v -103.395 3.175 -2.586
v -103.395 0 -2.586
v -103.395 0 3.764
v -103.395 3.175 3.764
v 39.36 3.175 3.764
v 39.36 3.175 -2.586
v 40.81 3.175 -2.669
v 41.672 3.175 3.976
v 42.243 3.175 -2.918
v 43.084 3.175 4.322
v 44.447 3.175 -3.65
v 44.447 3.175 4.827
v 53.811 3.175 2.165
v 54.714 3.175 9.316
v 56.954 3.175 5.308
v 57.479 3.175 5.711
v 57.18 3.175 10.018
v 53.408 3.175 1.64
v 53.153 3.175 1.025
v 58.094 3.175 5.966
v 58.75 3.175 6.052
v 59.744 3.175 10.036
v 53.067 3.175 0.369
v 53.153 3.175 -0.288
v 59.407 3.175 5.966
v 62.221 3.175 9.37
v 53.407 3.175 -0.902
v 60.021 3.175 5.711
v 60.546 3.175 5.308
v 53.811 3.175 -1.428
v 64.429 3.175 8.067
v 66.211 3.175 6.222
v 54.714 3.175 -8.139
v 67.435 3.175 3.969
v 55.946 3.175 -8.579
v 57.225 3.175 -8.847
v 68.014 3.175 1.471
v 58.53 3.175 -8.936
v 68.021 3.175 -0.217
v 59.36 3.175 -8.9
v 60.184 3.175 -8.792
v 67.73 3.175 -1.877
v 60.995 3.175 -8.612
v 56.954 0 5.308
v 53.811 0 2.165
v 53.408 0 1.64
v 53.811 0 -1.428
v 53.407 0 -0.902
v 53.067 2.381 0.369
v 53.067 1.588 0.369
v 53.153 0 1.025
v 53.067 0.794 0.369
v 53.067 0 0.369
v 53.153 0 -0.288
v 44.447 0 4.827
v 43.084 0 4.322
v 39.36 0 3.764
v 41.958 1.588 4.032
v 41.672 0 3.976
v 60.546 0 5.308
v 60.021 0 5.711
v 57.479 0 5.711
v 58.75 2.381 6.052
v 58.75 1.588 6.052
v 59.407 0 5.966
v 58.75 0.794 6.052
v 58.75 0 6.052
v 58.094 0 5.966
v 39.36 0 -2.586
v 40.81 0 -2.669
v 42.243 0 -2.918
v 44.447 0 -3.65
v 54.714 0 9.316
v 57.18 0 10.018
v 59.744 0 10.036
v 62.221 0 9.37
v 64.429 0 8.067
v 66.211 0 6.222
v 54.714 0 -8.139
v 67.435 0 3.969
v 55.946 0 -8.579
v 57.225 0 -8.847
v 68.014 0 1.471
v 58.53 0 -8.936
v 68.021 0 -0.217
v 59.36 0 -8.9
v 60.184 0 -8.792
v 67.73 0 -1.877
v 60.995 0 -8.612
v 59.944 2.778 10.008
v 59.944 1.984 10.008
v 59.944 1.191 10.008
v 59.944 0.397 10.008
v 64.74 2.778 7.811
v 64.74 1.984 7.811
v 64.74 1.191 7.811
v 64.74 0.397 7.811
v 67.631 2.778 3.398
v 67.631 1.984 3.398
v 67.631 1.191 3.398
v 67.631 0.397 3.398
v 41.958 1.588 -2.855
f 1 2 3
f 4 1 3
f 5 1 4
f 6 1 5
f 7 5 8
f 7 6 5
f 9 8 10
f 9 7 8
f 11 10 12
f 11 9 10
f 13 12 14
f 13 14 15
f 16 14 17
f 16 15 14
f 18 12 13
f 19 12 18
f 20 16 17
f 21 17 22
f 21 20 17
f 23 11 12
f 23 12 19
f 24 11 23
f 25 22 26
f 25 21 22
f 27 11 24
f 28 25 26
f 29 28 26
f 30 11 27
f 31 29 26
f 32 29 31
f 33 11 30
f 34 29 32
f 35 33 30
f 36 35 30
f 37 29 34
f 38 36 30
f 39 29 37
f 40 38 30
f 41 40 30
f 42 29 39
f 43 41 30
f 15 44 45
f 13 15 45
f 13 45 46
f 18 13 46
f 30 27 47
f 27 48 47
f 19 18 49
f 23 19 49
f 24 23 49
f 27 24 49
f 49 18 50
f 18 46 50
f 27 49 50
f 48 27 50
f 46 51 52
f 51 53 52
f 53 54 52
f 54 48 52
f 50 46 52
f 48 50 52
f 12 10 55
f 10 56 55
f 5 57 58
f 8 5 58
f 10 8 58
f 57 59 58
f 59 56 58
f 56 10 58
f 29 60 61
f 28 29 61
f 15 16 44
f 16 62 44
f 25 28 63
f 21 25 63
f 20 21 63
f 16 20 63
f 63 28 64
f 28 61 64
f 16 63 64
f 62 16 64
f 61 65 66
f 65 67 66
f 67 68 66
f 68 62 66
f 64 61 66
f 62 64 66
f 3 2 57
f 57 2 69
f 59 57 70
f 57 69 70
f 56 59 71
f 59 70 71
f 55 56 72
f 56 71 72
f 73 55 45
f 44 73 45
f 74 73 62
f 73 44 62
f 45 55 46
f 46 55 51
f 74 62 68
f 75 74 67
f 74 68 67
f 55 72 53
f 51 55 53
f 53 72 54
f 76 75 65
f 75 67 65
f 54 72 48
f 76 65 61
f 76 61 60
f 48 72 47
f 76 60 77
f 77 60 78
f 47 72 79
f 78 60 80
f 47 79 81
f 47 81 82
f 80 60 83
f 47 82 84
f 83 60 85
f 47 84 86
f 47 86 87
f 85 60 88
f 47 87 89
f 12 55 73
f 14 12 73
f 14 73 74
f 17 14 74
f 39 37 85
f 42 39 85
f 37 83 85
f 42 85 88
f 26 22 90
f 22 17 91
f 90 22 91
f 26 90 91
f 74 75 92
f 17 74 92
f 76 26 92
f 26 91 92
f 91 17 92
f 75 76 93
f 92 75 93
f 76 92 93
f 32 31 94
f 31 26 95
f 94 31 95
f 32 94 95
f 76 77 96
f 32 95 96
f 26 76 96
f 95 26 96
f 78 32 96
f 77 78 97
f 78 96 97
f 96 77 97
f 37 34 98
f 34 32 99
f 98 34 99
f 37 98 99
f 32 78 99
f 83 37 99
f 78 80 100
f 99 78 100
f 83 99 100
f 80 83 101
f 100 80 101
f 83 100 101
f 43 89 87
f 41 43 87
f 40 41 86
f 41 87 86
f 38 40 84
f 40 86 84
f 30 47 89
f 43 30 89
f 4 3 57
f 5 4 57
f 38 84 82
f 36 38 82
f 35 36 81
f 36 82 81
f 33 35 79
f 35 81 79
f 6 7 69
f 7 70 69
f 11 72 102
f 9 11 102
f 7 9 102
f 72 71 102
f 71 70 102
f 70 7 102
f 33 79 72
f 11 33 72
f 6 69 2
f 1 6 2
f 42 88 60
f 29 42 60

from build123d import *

# Parameters (mm, degrees)
BOSS_EXTRUDE1_DEPTH = 3.175


with BuildPart() as part:
    # Sketch1 → Boss-Extrude1 (new body)
    with BuildSketch(Plane(origin=(0, 0, 0), x_dir=(1, 0, 0), z_dir=(0, 1, 0))):
        with BuildLine():
            Line((1.259536023, 2.586263405), (-100.340463977, 2.586263405))
            Line((-100.340463977, 2.586263405), (-103.395029965, 2.586263405))
            Line((-103.395029965, 2.586263405), (-103.395029965, -3.763736604))
            Line((-103.395029965, -3.763736604), (39.35953602, -3.763736604))
            add(Edge.make_bspline(
                [(39.35953602, -3.763736604), (40.672498996, -3.763736604), (41.958231282, -4.032454171), (43.243430957, -4.301060422), (44.446955668, -4.827235355)],
                knots=[0, 0, 0, 0.5, 0.5, 1, 1, 1], degree=2))
            Line((44.446955668, -4.827235355), (54.714405304, -9.316112529))
            add(Edge.make_bspline(
                [(54.714405304, -9.316112529), (55.946669165, -9.854852073), (57.28046692, -10.031425137), (58.61345219, -10.207890641), (59.944261722, -10.008152925), (61.273983438, -9.808578475), (62.497433966, -9.248116189), (63.719884433, -8.68811203), (64.740280541, -7.810763211), (65.759842568, -6.934131546), (66.497371281, -5.80852035), (67.234297131, -4.683829239), (67.631270692, -3.397998317), (68.027919764, -2.113218446), (68.053287839, -0.767742461), (68.078640466, 0.576914214), (67.730413535, 1.876514813)],
                knots=[0, 0, 0, 0.125, 0.125, 0.25, 0.25, 0.375, 0.375, 0.5, 0.5, 0.625, 0.625, 0.75, 0.75, 0.875, 0.875, 1, 1, 1], degree=2))
            Line((67.730413535, 1.876514813), (60.546208639, -5.307690084))
            add(Edge.make_bspline(
                [(60.546208639, -5.307690084), (60.189154092, -5.664744631), (59.722173333, -5.858292872), (59.255944804, -6.051529339), (58.750157415, -6.05163886), (58.245470025, -6.051748143), (57.778141496, -5.858292872), (57.311565034, -5.665148928), (56.954106191, -5.307690084)],
                knots=[0, 0, 0, 0.25, 0.25, 0.5, 0.5, 0.75, 0.75, 1, 1, 1], degree=2))
            Line((56.954106191, -5.307690084), (53.811016549, -2.164600442))
            add(Edge.make_bspline(
                [(53.811016549, -2.164600442), (53.453962002, -1.807545895), (53.26041376, -1.340565136), (53.067177294, -0.874336608), (53.067067773, -0.368549218), (53.06695849, 0.136138171), (53.26041376, 0.6034667), (53.453557705, 1.070043162), (53.811016549, 1.427502006)],
                knots=[0, 0, 0, 0.25, 0.25, 0.5, 0.5, 0.75, 0.75, 1, 1, 1], degree=2))
            Line((53.811016549, 1.427502006), (60.995221446, 8.611706903))
            ThreePointArc((60.995221446, 8.611706903), (59.773232018, 8.854775714), (58.529970033, 8.93626341))
            ThreePointArc((58.529970033, 8.93626341), (56.580948585, 8.734725234), (54.714405295, 8.138639345))
            Line((54.714405295, 8.138639345), (44.446955671, 3.649762156))
            add(Edge.make_bspline(
                [(44.446955671, 3.649762156), (43.243940291, 3.1238099), (41.958231285, 2.854980972), (40.67305488, 2.586263405), (39.359536023, 2.586263405)],
                knots=[0, 0, 0, 0.5, 0.5, 1, 1, 1], degree=2))
            Line((39.359536023, 2.586263405), (1.259536023, 2.586263405))
        make_face()
    extrude(amount=BOSS_EXTRUDE1_DEPTH)


solid = part.part
